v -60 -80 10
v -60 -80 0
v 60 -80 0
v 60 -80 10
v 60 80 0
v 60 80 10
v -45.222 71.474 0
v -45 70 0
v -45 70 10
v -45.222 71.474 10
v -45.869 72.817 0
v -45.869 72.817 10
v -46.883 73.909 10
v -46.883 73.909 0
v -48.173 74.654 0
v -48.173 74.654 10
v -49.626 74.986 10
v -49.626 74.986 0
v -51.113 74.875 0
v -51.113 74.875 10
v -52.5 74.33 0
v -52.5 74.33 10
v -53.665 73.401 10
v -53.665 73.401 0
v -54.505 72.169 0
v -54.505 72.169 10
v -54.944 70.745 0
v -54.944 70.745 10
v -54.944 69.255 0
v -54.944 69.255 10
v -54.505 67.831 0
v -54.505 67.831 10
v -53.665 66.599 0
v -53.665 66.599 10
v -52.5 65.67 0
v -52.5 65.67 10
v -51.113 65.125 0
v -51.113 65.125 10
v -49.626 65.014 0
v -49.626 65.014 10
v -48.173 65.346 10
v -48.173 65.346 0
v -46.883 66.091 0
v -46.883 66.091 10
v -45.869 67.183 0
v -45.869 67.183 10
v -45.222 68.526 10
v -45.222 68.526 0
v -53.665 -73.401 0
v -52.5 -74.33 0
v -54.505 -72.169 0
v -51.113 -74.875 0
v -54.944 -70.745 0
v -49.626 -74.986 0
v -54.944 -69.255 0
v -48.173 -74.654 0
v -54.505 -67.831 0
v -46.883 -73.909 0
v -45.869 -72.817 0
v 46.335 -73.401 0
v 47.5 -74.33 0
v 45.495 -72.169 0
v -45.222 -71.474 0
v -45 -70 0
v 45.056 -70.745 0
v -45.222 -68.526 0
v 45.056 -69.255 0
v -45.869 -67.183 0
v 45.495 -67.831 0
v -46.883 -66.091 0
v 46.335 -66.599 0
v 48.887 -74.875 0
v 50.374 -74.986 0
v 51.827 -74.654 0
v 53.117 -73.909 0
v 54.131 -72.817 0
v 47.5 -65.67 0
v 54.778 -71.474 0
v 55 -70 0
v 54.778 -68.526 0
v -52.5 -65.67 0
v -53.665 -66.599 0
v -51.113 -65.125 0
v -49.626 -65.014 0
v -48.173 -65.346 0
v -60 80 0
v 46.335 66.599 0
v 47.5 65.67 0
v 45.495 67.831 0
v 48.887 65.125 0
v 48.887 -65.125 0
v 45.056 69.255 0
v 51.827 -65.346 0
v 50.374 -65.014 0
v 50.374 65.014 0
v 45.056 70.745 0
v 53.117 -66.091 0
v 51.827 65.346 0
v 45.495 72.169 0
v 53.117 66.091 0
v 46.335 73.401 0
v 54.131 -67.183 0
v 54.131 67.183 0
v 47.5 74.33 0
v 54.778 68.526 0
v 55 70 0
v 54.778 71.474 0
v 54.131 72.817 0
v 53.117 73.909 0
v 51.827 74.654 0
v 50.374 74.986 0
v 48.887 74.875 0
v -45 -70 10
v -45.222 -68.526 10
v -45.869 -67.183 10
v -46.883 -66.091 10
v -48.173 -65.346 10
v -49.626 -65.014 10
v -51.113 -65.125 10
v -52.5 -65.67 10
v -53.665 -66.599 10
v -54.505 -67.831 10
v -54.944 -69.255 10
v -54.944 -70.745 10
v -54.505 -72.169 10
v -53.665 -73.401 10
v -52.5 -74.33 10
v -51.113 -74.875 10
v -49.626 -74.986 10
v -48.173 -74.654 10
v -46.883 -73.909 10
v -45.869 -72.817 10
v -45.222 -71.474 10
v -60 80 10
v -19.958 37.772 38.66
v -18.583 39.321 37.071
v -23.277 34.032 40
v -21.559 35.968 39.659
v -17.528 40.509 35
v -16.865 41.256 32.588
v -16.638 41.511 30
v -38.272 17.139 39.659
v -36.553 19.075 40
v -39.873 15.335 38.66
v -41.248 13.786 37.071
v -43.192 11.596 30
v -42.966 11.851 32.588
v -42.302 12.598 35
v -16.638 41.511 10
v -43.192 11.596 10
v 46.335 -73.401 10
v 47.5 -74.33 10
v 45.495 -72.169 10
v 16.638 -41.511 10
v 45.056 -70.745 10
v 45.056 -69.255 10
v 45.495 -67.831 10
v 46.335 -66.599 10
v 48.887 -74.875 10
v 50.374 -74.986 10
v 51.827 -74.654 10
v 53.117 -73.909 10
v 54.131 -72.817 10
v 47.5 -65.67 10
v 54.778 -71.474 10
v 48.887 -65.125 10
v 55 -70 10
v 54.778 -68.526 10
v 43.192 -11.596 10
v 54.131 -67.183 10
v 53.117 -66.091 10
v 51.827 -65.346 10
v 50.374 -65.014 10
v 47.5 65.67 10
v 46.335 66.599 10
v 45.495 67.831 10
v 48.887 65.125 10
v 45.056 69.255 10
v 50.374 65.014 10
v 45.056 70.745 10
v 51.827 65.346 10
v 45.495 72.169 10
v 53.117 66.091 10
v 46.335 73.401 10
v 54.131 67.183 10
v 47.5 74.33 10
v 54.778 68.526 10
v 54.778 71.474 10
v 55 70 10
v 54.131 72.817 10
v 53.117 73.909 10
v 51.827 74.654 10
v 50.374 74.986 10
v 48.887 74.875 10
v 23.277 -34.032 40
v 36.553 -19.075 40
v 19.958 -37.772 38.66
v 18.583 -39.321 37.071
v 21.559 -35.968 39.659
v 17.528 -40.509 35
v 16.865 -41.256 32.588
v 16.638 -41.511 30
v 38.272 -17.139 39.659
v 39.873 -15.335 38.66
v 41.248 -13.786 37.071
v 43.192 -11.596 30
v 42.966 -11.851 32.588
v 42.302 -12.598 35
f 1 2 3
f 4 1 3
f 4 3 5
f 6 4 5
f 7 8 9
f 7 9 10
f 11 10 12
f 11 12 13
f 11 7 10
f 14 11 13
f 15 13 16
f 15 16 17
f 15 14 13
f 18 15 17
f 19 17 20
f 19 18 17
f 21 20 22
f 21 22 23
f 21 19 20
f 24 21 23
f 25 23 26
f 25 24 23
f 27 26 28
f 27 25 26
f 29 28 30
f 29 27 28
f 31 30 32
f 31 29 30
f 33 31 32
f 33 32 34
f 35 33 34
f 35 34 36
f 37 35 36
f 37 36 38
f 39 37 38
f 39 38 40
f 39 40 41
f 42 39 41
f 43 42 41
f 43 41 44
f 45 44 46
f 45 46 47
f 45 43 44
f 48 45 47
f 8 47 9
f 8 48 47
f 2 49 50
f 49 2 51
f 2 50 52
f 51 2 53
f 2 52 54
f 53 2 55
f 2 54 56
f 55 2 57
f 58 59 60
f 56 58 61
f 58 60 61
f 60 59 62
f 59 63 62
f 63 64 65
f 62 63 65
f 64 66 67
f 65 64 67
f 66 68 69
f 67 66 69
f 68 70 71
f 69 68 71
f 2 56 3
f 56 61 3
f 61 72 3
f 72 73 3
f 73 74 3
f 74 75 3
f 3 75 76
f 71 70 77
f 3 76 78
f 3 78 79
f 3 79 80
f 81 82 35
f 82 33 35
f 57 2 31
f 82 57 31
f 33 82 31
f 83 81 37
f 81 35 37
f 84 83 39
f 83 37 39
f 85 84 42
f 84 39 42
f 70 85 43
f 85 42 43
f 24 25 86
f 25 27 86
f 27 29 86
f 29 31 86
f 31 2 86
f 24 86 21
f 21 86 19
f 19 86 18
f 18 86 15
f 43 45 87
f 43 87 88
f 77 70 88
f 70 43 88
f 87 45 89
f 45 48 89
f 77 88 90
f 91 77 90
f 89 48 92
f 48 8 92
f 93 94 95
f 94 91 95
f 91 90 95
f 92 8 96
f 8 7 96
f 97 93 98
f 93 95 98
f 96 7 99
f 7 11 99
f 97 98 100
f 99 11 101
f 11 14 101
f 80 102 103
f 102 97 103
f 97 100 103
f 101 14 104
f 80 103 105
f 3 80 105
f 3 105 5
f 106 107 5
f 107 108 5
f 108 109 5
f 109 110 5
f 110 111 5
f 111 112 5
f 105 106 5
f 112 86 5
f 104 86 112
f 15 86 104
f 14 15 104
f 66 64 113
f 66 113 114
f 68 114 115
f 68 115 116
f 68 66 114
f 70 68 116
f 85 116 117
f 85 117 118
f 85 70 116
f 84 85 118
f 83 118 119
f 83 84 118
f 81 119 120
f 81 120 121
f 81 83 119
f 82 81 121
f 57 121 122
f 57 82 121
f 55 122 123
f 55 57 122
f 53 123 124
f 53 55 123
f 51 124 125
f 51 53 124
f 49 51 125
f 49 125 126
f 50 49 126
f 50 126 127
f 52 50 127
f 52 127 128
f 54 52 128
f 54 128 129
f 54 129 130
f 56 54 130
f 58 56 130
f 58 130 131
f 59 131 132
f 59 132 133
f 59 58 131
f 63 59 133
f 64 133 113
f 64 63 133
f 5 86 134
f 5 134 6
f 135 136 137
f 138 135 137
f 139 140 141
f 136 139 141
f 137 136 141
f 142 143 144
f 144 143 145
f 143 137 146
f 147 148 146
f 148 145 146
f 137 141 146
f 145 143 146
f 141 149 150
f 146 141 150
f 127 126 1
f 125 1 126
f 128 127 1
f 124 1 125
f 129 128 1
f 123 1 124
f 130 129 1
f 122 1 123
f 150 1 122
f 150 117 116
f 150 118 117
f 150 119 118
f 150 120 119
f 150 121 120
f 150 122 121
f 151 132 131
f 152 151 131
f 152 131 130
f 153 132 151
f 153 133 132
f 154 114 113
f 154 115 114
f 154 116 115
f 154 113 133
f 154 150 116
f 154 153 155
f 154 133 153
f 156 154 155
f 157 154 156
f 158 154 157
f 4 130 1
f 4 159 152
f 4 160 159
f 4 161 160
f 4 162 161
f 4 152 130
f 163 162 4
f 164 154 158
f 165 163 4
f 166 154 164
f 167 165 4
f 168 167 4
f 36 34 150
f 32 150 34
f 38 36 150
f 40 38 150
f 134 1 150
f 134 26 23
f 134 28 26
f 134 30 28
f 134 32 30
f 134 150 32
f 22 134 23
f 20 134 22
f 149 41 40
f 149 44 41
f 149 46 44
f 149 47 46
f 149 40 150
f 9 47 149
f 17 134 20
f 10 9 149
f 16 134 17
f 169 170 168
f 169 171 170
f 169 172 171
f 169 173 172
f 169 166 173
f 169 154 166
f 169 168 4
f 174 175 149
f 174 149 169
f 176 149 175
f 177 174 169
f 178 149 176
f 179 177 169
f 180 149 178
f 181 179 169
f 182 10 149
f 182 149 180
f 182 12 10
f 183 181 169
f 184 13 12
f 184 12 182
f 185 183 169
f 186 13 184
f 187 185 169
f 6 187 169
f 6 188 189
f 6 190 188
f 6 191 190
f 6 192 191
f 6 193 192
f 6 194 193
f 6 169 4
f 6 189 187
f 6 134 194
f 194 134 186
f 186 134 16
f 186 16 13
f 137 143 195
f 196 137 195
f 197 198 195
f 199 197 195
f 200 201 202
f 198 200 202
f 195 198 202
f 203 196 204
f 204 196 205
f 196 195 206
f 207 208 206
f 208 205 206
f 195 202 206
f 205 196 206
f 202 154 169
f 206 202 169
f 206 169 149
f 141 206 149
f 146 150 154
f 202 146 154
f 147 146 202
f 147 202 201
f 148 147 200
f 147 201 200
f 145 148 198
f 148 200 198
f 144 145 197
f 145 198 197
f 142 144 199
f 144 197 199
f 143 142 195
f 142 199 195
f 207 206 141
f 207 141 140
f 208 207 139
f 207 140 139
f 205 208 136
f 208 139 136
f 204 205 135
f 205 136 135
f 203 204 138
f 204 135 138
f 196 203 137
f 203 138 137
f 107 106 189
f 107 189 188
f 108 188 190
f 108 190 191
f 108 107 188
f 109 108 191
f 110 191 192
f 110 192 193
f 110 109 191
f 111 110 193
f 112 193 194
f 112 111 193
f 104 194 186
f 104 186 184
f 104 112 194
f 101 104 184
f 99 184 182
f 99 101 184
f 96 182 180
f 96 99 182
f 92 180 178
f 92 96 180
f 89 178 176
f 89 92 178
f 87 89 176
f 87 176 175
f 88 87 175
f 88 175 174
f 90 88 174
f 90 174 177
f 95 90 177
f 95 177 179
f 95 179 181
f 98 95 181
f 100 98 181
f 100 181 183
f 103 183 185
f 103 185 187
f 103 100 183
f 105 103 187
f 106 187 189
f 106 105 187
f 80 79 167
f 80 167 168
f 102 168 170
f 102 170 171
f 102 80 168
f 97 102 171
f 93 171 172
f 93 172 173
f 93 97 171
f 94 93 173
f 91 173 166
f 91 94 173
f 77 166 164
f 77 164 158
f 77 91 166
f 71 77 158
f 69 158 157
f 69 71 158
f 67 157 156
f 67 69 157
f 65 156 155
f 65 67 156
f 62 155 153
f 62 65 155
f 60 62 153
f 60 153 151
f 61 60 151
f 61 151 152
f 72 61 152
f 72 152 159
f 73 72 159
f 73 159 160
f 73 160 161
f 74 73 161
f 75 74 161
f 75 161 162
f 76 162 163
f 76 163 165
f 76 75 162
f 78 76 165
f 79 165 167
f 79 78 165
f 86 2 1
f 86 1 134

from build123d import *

# Parameters (mm, degrees)
F1_DEPTH = 40
F0_W     = 120
F0_H     = 160
F0_R     = 5
F2_DEPTH = 10
F3_R     = 10


with BuildPart() as f1:
    # F0 (on Top) → F1 (new body)
    with BuildSketch(Plane.XY):
        Polygon((16.638367, -41.511019), (43.191836, -11.595918), (-16.638367, 41.511019), (-43.191836, 11.595918), align=None)
    extrude(amount=F1_DEPTH)

    # F0 (on Top) → F2 (join)
    with BuildSketch(Plane.XY):
        Rectangle(F0_W, F0_H)
        with Locations((-50, -70)):
            Circle(F0_R, mode=Mode.SUBTRACT)
        with Locations((50, -70)):
            Circle(F0_R, mode=Mode.SUBTRACT)
        Polygon((-16.638367, 41.511019), (43.191836, -11.595918), (16.638367, -41.511019), (-43.191836, 11.595918), align=None, mode=Mode.SUBTRACT)
        with Locations((-50, 70)):
            Circle(F0_R, mode=Mode.SUBTRACT)
        with Locations((50, 70)):
            Circle(F0_R, mode=Mode.SUBTRACT)
    extrude(amount=F2_DEPTH)

    # F3
    f3_edges = [f1.edges().sort_by_distance(p)[0] for p in [
        (13.276734, 14.957551, 40),
        (-13.276734, -14.957551, 40),
    ]]
    fillet(f3_edges, radius=F3_R)


solid = f1.part
